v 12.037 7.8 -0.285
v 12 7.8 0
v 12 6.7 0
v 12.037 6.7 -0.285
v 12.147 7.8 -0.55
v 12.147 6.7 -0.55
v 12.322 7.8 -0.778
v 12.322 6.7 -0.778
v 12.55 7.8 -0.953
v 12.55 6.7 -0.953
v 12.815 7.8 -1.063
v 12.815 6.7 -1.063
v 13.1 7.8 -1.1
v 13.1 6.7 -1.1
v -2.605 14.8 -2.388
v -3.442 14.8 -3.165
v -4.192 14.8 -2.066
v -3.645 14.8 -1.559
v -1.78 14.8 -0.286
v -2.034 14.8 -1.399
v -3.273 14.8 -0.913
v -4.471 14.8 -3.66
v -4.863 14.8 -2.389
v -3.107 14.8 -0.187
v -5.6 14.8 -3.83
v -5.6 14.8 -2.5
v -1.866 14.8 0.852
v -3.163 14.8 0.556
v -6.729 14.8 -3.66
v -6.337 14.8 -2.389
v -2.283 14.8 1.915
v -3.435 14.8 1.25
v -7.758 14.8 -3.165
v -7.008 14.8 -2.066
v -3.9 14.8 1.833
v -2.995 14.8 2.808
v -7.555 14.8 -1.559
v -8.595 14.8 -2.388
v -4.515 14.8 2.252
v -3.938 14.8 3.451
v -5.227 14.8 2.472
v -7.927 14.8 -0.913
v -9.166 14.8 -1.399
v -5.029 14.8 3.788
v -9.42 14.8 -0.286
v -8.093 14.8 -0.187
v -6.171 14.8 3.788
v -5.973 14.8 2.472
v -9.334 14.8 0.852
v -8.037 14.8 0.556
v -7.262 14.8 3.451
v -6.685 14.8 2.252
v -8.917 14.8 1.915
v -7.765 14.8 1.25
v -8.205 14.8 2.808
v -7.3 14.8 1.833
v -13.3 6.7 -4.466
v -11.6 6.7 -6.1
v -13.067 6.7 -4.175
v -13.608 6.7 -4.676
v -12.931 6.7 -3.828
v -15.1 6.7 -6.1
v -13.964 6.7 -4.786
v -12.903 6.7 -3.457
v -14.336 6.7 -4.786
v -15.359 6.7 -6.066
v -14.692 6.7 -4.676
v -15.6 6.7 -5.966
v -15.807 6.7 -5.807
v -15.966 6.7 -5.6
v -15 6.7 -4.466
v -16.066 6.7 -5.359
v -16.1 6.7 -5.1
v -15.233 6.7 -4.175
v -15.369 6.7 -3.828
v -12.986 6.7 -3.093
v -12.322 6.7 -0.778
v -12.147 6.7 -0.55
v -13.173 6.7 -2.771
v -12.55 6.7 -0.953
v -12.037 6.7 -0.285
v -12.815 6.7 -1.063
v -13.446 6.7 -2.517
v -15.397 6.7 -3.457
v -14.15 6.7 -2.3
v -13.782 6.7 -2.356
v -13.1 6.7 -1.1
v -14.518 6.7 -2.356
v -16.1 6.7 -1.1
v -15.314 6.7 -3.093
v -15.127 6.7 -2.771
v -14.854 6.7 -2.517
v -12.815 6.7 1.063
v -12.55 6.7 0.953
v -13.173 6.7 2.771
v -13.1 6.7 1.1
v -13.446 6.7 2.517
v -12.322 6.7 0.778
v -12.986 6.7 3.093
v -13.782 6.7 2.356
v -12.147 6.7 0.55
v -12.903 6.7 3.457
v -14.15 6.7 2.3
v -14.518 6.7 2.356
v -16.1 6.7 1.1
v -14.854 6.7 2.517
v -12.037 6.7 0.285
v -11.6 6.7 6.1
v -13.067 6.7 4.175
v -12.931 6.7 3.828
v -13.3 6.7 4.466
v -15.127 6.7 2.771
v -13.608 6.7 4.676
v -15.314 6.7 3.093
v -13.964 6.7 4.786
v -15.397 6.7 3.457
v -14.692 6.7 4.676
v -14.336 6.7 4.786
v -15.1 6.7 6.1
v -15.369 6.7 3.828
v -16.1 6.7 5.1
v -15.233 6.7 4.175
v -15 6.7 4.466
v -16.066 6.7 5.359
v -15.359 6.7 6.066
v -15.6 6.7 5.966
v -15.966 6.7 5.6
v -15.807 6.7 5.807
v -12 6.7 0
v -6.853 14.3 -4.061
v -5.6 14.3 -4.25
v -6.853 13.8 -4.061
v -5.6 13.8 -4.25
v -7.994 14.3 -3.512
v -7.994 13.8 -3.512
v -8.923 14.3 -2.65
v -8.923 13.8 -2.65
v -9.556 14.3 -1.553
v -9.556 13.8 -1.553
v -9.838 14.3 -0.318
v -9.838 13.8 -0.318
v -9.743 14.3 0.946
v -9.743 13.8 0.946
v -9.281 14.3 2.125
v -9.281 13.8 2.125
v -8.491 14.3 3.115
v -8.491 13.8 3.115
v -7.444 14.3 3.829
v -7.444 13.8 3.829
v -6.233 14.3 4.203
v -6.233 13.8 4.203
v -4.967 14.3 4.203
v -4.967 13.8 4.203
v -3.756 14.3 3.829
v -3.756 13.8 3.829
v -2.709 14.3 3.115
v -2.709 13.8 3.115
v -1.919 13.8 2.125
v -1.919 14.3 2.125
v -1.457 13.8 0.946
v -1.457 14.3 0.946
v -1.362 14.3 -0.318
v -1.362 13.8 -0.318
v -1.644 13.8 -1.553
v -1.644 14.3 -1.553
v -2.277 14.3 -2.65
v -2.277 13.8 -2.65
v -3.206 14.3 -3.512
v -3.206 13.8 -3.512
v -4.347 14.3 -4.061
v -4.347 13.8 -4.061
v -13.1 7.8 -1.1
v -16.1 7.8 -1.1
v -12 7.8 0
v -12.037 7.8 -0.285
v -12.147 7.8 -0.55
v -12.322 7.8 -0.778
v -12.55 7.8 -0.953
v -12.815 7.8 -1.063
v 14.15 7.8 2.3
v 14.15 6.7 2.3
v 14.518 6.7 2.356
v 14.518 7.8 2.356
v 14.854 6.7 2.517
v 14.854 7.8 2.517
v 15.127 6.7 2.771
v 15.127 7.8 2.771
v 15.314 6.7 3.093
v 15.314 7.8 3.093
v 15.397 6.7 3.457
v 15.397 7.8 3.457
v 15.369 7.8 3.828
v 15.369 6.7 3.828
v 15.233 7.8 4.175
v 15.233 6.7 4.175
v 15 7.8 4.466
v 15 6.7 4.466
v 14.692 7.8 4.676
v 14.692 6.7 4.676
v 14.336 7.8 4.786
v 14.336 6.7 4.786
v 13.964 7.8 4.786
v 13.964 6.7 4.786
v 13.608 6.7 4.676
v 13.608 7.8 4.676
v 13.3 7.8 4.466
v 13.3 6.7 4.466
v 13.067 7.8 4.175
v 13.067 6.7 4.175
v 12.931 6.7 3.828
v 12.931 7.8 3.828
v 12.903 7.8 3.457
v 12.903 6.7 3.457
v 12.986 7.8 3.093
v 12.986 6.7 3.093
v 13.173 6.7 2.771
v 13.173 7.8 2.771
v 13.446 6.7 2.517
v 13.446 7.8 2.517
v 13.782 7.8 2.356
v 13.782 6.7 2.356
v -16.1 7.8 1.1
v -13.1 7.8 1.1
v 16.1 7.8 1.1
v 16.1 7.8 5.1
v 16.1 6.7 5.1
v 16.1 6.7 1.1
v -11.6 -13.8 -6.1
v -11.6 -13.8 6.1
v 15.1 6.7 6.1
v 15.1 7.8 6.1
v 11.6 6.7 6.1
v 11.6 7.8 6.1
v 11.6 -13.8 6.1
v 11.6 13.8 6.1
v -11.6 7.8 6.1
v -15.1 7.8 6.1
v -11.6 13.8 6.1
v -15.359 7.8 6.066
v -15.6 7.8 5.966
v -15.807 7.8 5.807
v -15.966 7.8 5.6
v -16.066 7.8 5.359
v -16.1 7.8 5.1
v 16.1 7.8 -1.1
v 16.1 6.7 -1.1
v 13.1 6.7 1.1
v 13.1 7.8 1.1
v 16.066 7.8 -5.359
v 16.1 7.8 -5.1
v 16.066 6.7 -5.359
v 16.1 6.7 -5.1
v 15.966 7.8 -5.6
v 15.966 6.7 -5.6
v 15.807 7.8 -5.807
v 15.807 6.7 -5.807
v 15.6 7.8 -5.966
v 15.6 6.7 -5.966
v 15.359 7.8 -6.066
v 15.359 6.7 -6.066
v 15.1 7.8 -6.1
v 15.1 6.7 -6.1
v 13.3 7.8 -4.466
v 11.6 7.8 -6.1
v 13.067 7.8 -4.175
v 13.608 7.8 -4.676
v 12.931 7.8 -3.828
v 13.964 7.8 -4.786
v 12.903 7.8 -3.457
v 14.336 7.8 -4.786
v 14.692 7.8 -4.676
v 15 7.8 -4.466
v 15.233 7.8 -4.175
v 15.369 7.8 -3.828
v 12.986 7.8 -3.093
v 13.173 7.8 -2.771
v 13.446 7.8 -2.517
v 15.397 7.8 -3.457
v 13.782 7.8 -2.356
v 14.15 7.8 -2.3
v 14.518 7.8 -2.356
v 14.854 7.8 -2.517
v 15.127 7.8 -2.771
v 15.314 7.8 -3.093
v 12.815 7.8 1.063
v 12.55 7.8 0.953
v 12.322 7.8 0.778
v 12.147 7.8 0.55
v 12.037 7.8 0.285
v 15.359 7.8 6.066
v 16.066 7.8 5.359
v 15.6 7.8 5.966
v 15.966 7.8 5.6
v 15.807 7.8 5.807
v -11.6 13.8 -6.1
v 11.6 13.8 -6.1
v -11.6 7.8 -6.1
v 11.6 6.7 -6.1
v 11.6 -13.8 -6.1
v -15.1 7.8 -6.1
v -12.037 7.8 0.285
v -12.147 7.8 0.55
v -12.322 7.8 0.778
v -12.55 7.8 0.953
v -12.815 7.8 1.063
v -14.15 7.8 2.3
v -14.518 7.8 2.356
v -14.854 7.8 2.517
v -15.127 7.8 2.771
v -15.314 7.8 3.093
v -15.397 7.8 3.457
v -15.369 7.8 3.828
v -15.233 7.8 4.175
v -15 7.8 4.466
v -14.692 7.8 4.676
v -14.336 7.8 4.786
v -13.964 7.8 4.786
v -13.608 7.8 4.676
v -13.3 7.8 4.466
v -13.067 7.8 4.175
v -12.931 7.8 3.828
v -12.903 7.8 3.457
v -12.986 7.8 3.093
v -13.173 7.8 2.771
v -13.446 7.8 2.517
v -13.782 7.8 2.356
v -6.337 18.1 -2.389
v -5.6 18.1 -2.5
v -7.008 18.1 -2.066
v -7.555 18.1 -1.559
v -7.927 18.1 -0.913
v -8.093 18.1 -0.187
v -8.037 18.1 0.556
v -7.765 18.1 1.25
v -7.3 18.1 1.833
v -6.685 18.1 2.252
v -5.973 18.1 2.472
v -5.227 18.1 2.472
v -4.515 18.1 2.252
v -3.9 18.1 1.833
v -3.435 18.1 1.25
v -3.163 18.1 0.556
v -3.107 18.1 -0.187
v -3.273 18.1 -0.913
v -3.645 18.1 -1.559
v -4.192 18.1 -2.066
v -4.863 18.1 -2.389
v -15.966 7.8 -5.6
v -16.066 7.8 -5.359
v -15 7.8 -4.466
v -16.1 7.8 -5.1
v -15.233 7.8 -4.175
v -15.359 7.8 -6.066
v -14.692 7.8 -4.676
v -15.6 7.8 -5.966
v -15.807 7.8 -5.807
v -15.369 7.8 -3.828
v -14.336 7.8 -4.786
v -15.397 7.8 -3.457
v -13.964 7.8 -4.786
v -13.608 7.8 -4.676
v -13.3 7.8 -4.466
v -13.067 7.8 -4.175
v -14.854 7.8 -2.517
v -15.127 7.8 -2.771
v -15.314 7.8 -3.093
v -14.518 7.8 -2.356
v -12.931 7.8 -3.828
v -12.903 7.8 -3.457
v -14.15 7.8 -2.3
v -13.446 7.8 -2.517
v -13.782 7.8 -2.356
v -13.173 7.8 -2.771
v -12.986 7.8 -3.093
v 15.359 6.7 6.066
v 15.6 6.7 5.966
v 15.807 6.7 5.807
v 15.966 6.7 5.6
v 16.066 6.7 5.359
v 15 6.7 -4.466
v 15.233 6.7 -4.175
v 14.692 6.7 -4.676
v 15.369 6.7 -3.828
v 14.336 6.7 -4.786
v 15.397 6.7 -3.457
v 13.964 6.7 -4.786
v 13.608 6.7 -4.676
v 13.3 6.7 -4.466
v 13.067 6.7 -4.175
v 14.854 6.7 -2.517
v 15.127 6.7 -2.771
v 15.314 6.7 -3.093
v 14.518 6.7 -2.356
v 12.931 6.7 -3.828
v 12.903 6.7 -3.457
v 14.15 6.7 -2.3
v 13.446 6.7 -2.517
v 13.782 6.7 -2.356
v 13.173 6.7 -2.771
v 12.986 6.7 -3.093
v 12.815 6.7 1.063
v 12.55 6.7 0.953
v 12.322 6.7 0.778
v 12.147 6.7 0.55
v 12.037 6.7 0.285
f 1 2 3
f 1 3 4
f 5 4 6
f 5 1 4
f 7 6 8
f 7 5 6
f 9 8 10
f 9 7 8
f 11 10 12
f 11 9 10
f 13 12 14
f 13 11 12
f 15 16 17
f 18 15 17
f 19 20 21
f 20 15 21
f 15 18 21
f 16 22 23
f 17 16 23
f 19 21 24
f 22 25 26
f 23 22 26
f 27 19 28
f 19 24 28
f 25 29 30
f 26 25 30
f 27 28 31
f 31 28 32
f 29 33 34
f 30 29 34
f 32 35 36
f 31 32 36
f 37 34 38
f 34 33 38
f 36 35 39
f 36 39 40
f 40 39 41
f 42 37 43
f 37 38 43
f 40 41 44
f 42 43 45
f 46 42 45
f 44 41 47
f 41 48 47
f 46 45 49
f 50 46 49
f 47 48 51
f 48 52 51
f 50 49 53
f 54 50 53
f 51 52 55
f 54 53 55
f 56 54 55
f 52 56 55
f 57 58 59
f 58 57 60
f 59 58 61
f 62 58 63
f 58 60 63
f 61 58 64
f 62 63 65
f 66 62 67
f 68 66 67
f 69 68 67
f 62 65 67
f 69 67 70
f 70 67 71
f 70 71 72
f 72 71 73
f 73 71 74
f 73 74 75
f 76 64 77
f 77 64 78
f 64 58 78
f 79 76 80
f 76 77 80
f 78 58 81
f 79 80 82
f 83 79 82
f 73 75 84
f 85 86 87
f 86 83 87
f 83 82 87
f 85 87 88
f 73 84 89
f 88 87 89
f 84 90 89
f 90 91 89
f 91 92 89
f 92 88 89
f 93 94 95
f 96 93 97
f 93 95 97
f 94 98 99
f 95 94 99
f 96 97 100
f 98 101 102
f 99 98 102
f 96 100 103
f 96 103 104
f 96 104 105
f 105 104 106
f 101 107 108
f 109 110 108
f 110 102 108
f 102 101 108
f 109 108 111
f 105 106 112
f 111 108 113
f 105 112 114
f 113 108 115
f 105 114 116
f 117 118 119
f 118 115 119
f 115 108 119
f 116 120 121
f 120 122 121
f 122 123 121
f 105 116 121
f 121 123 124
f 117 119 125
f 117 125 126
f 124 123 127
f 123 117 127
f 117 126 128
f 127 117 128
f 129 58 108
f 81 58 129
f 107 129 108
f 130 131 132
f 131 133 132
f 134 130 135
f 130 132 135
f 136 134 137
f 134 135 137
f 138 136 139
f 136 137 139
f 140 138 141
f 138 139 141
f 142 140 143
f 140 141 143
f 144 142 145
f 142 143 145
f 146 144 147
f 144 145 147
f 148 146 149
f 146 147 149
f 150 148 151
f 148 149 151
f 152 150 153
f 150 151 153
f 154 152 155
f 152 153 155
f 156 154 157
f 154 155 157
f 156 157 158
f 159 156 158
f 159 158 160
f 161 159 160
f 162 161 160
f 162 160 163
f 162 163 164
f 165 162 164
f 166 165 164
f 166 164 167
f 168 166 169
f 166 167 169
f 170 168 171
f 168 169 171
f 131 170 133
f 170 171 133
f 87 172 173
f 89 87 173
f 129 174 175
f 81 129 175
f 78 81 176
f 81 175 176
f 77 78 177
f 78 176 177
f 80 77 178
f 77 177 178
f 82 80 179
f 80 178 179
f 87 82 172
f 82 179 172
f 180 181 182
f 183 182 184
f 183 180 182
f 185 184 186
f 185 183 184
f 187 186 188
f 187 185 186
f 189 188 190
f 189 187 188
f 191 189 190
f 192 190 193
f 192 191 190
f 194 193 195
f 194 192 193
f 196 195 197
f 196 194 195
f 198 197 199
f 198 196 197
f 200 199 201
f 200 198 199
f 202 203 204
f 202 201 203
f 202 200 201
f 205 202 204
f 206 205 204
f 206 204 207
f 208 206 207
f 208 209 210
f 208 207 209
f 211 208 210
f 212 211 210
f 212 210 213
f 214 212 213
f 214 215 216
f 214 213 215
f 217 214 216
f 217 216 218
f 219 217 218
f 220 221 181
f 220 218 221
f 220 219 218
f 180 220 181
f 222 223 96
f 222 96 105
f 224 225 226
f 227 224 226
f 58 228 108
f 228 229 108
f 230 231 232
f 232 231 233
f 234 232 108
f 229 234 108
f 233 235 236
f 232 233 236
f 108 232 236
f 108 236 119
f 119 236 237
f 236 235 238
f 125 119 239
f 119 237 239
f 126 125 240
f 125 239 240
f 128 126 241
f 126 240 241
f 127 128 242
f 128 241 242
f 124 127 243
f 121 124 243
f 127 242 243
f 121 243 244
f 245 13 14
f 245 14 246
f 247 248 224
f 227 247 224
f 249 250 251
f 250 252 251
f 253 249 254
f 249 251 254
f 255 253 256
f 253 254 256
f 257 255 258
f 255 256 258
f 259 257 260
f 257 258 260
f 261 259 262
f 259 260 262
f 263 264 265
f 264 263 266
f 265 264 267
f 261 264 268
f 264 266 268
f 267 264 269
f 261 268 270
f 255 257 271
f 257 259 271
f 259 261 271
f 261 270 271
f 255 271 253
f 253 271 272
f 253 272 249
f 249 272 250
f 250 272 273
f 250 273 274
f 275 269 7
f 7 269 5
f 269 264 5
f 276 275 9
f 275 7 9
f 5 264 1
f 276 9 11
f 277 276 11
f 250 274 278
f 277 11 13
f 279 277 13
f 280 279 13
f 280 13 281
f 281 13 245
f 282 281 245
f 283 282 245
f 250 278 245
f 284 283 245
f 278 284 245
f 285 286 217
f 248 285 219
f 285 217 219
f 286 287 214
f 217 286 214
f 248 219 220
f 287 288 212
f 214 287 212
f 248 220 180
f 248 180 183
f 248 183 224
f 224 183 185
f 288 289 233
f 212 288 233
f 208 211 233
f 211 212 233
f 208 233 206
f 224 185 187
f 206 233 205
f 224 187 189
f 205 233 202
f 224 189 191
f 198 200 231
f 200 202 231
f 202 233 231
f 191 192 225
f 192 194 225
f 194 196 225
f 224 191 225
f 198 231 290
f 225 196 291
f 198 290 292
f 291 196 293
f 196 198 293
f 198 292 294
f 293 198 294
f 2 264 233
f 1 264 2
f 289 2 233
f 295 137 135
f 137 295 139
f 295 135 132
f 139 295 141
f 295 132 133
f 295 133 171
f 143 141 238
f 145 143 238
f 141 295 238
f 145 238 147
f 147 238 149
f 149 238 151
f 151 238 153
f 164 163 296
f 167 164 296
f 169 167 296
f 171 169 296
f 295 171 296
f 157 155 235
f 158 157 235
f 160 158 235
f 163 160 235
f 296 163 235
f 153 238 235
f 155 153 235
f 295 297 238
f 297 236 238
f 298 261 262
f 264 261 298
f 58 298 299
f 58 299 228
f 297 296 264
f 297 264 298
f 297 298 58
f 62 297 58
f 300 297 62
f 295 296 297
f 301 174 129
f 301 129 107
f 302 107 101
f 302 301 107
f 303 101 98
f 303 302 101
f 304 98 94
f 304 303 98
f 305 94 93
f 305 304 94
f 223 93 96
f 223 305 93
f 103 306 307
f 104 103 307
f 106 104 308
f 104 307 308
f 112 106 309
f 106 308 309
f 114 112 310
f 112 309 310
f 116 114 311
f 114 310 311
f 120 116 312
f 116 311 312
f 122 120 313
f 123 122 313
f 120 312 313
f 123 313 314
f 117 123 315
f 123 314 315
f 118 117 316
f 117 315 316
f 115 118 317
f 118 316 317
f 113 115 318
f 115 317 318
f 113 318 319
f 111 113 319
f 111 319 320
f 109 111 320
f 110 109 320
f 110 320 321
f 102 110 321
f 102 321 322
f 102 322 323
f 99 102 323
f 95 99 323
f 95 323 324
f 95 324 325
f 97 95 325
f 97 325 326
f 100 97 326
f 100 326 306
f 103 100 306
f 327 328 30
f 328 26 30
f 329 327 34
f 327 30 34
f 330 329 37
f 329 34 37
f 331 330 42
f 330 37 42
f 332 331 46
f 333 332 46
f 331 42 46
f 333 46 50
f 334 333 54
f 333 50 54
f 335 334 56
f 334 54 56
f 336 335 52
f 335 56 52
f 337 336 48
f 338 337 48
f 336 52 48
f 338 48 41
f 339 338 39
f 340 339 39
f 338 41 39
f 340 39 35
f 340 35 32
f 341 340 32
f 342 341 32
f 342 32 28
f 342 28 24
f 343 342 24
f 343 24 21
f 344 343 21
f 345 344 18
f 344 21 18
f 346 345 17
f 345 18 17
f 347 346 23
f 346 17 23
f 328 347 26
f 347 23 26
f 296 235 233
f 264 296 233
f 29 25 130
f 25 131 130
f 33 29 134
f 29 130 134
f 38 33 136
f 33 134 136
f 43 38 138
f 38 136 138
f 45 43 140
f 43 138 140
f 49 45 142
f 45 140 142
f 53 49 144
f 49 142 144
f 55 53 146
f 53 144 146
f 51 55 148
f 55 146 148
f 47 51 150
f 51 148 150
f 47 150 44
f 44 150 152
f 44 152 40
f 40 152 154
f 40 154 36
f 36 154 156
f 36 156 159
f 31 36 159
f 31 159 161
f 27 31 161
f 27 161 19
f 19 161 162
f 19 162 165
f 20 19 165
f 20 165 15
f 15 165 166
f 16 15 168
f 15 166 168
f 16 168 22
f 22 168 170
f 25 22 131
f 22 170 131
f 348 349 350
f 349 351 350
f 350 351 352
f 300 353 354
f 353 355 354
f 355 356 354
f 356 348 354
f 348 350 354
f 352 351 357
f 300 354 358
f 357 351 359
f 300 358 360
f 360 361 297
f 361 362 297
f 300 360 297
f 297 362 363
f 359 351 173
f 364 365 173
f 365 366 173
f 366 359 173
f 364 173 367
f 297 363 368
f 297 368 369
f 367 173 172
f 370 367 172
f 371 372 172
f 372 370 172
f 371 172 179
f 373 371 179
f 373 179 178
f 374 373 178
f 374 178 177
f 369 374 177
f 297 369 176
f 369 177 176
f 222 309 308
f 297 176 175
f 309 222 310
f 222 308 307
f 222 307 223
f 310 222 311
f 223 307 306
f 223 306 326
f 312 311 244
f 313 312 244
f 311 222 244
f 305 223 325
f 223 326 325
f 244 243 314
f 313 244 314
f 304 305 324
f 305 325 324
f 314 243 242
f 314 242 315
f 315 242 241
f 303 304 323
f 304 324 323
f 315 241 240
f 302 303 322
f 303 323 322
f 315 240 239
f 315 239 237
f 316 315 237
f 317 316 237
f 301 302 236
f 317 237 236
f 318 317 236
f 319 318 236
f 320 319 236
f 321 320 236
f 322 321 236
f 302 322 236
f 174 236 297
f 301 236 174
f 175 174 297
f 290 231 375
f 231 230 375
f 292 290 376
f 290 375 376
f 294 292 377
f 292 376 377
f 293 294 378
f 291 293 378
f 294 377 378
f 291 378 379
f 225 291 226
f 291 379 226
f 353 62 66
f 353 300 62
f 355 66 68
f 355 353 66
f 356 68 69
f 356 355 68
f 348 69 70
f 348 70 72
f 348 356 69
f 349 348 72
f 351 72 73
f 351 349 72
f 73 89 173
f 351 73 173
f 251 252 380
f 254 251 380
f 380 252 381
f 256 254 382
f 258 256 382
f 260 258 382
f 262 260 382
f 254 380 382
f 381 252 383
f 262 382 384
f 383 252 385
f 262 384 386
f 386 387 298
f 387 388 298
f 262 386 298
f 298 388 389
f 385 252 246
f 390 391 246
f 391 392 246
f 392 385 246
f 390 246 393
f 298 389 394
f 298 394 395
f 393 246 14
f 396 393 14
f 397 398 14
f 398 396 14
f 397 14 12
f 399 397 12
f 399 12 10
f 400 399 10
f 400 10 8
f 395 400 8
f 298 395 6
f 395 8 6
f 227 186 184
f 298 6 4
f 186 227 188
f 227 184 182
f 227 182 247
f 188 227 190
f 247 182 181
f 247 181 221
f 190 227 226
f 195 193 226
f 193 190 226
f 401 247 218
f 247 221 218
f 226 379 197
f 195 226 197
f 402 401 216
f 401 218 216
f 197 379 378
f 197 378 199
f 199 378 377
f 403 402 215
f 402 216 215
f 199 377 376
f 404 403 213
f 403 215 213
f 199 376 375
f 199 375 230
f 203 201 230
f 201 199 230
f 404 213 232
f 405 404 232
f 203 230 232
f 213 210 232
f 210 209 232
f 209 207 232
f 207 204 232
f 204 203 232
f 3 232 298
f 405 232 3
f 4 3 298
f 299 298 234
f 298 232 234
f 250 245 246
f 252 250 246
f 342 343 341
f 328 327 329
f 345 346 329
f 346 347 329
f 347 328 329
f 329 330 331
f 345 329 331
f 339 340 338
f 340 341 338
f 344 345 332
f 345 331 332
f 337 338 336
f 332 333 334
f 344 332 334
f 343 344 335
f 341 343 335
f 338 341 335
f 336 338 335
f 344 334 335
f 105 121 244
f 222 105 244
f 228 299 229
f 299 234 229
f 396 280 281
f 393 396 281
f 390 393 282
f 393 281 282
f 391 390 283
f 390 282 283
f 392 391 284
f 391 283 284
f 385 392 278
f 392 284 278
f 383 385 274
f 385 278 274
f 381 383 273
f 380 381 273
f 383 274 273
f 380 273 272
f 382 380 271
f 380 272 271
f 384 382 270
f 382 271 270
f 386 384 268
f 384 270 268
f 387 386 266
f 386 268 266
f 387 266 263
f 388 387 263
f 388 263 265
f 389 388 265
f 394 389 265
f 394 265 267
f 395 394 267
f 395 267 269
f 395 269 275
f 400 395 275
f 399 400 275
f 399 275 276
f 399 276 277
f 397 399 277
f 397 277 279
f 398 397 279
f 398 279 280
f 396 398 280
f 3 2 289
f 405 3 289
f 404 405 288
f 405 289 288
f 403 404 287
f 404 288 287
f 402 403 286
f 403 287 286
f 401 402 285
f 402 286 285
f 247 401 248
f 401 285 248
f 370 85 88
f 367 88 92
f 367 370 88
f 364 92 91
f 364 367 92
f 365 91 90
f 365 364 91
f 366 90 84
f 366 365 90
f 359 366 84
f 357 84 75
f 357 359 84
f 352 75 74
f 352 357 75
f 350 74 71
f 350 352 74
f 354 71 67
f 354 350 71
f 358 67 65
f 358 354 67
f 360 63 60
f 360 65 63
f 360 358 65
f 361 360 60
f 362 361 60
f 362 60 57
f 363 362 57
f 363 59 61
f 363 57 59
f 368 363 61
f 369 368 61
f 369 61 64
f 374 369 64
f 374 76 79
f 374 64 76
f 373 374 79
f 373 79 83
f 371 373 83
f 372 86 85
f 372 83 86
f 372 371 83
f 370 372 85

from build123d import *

# Parameters (mm, degrees)
BOSS_EXTRUDE1_DEPTH     = 6.1
SKETCH3_R               = 1.25
CUT_EXTRUDE1_DEPTH      = 28.622092607
MIRROR1_COPY_1_SKETCH_R = 1.25
MIRROR1_COPY_1_DEPTH    = 28.622092607
FILLET1_R               = 1


with BuildPart() as part:
    # Sketch1 → Boss-Extrude1 (new, symmetric)
    with BuildSketch(Plane.XY):
        Polygon((11.6, 7.8), (16.1, 7.8), (16.1, 6.7), (11.6, 6.7), (11.6, -13.8), (-11.6, -13.8), (-11.6, 6.7), (-16.1, 6.7), (-16.1, 7.8), (-11.6, 7.8), (-11.6, 13.8), (11.6, 13.8), align=None)
    extrude(amount=BOSS_EXTRUDE1_DEPTH, both=True)

    # Sketch2 → Revolve1 (revolve)
    with BuildSketch(Plane.XY, mode=Mode.PRIVATE) as revolve1_sk:
        Polygon((-5.6, 18.1), (-8.1, 18.1), (-8.1, 14.8), (-9.430450184, 14.8), (-9.85, 14.3), (-9.85, 13.8), (-5.6, 13.8), align=None)
    revolve(revolve1_sk.sketch.rotate(Axis((-5.6, 13.8, 0), (0, 1, 0)), 270), axis=Axis((-5.6, 13.8, 0), (0, 1, 0)))

    # Sketch3 → Cut-Extrude1 (cut, through all)
    with BuildSketch(Plane(origin=(0, 7.8, 0), x_dir=(1, 0, 0), z_dir=(0, 1, 0))):
        with Locations(Location((14.15, 3.55, 0), (0, 0, 270))):
            Circle(SKETCH3_R)
        with BuildLine():
            Line((16.1, 0), (13.1, 0))
            Line((13.1, 0), (12, 0))
            ThreePointArc((12, 0), (12.322182541, 0.777817459), (13.1, 1.1))
            Line((13.1, 1.1), (16.1, 1.1))
            Line((16.1, 1.1), (16.1, 0))
        make_face()
    cut_extrude1 = extrude(amount=-CUT_EXTRUDE1_DEPTH, mode=Mode.SUBTRACT)

    # Mirror4: Cut-Extrude1 across plane
    add(cut_extrude1.mirror(Plane(origin=(0, 0, 0), x_dir=(0, 0, 1), z_dir=(1, 0, 0))), mode=Mode.SUBTRACT)

    # Mirror1: Cut-Extrude1 across plane
    add(cut_extrude1.mirror(Plane(origin=(16.1, -13.8, 0), x_dir=(1, 0, 0), z_dir=(0, 0, 1))), mode=Mode.SUBTRACT)

    # Mirror1 copy 1 sketch → Mirror1 copy 1 (cut, through all)
    with BuildSketch(Plane(origin=(0, 7.8, 0), x_dir=(-1, 0, 0), z_dir=(0, 1, 0))):
        with Locations(Location((14.15, 3.55, 0), (0, 0, 270))):
            Circle(MIRROR1_COPY_1_SKETCH_R)
        with BuildLine():
            Line((16.1, 0), (13.1, 0))
            Line((13.1, 0), (12, 0))
            ThreePointArc((12, 0), (12.322182541, 0.777817459), (13.1, 1.1))
            Line((13.1, 1.1), (16.1, 1.1))
            Line((16.1, 1.1), (16.1, 0))
        make_face()
    extrude(amount=-MIRROR1_COPY_1_DEPTH, mode=Mode.SUBTRACT)

    # Fillet1
    fillet1_edges = [part.edges().sort_by_distance(p)[0] for p in [
        (-16.1, 7.25, 6.1),
        (16.1, 7.25, -6.1),
        (-16.1, 7.25, -6.1),
        (16.1, 7.25, 6.1),
    ]]
    fillet(fillet1_edges, radius=FILLET1_R)


solid = part.part
